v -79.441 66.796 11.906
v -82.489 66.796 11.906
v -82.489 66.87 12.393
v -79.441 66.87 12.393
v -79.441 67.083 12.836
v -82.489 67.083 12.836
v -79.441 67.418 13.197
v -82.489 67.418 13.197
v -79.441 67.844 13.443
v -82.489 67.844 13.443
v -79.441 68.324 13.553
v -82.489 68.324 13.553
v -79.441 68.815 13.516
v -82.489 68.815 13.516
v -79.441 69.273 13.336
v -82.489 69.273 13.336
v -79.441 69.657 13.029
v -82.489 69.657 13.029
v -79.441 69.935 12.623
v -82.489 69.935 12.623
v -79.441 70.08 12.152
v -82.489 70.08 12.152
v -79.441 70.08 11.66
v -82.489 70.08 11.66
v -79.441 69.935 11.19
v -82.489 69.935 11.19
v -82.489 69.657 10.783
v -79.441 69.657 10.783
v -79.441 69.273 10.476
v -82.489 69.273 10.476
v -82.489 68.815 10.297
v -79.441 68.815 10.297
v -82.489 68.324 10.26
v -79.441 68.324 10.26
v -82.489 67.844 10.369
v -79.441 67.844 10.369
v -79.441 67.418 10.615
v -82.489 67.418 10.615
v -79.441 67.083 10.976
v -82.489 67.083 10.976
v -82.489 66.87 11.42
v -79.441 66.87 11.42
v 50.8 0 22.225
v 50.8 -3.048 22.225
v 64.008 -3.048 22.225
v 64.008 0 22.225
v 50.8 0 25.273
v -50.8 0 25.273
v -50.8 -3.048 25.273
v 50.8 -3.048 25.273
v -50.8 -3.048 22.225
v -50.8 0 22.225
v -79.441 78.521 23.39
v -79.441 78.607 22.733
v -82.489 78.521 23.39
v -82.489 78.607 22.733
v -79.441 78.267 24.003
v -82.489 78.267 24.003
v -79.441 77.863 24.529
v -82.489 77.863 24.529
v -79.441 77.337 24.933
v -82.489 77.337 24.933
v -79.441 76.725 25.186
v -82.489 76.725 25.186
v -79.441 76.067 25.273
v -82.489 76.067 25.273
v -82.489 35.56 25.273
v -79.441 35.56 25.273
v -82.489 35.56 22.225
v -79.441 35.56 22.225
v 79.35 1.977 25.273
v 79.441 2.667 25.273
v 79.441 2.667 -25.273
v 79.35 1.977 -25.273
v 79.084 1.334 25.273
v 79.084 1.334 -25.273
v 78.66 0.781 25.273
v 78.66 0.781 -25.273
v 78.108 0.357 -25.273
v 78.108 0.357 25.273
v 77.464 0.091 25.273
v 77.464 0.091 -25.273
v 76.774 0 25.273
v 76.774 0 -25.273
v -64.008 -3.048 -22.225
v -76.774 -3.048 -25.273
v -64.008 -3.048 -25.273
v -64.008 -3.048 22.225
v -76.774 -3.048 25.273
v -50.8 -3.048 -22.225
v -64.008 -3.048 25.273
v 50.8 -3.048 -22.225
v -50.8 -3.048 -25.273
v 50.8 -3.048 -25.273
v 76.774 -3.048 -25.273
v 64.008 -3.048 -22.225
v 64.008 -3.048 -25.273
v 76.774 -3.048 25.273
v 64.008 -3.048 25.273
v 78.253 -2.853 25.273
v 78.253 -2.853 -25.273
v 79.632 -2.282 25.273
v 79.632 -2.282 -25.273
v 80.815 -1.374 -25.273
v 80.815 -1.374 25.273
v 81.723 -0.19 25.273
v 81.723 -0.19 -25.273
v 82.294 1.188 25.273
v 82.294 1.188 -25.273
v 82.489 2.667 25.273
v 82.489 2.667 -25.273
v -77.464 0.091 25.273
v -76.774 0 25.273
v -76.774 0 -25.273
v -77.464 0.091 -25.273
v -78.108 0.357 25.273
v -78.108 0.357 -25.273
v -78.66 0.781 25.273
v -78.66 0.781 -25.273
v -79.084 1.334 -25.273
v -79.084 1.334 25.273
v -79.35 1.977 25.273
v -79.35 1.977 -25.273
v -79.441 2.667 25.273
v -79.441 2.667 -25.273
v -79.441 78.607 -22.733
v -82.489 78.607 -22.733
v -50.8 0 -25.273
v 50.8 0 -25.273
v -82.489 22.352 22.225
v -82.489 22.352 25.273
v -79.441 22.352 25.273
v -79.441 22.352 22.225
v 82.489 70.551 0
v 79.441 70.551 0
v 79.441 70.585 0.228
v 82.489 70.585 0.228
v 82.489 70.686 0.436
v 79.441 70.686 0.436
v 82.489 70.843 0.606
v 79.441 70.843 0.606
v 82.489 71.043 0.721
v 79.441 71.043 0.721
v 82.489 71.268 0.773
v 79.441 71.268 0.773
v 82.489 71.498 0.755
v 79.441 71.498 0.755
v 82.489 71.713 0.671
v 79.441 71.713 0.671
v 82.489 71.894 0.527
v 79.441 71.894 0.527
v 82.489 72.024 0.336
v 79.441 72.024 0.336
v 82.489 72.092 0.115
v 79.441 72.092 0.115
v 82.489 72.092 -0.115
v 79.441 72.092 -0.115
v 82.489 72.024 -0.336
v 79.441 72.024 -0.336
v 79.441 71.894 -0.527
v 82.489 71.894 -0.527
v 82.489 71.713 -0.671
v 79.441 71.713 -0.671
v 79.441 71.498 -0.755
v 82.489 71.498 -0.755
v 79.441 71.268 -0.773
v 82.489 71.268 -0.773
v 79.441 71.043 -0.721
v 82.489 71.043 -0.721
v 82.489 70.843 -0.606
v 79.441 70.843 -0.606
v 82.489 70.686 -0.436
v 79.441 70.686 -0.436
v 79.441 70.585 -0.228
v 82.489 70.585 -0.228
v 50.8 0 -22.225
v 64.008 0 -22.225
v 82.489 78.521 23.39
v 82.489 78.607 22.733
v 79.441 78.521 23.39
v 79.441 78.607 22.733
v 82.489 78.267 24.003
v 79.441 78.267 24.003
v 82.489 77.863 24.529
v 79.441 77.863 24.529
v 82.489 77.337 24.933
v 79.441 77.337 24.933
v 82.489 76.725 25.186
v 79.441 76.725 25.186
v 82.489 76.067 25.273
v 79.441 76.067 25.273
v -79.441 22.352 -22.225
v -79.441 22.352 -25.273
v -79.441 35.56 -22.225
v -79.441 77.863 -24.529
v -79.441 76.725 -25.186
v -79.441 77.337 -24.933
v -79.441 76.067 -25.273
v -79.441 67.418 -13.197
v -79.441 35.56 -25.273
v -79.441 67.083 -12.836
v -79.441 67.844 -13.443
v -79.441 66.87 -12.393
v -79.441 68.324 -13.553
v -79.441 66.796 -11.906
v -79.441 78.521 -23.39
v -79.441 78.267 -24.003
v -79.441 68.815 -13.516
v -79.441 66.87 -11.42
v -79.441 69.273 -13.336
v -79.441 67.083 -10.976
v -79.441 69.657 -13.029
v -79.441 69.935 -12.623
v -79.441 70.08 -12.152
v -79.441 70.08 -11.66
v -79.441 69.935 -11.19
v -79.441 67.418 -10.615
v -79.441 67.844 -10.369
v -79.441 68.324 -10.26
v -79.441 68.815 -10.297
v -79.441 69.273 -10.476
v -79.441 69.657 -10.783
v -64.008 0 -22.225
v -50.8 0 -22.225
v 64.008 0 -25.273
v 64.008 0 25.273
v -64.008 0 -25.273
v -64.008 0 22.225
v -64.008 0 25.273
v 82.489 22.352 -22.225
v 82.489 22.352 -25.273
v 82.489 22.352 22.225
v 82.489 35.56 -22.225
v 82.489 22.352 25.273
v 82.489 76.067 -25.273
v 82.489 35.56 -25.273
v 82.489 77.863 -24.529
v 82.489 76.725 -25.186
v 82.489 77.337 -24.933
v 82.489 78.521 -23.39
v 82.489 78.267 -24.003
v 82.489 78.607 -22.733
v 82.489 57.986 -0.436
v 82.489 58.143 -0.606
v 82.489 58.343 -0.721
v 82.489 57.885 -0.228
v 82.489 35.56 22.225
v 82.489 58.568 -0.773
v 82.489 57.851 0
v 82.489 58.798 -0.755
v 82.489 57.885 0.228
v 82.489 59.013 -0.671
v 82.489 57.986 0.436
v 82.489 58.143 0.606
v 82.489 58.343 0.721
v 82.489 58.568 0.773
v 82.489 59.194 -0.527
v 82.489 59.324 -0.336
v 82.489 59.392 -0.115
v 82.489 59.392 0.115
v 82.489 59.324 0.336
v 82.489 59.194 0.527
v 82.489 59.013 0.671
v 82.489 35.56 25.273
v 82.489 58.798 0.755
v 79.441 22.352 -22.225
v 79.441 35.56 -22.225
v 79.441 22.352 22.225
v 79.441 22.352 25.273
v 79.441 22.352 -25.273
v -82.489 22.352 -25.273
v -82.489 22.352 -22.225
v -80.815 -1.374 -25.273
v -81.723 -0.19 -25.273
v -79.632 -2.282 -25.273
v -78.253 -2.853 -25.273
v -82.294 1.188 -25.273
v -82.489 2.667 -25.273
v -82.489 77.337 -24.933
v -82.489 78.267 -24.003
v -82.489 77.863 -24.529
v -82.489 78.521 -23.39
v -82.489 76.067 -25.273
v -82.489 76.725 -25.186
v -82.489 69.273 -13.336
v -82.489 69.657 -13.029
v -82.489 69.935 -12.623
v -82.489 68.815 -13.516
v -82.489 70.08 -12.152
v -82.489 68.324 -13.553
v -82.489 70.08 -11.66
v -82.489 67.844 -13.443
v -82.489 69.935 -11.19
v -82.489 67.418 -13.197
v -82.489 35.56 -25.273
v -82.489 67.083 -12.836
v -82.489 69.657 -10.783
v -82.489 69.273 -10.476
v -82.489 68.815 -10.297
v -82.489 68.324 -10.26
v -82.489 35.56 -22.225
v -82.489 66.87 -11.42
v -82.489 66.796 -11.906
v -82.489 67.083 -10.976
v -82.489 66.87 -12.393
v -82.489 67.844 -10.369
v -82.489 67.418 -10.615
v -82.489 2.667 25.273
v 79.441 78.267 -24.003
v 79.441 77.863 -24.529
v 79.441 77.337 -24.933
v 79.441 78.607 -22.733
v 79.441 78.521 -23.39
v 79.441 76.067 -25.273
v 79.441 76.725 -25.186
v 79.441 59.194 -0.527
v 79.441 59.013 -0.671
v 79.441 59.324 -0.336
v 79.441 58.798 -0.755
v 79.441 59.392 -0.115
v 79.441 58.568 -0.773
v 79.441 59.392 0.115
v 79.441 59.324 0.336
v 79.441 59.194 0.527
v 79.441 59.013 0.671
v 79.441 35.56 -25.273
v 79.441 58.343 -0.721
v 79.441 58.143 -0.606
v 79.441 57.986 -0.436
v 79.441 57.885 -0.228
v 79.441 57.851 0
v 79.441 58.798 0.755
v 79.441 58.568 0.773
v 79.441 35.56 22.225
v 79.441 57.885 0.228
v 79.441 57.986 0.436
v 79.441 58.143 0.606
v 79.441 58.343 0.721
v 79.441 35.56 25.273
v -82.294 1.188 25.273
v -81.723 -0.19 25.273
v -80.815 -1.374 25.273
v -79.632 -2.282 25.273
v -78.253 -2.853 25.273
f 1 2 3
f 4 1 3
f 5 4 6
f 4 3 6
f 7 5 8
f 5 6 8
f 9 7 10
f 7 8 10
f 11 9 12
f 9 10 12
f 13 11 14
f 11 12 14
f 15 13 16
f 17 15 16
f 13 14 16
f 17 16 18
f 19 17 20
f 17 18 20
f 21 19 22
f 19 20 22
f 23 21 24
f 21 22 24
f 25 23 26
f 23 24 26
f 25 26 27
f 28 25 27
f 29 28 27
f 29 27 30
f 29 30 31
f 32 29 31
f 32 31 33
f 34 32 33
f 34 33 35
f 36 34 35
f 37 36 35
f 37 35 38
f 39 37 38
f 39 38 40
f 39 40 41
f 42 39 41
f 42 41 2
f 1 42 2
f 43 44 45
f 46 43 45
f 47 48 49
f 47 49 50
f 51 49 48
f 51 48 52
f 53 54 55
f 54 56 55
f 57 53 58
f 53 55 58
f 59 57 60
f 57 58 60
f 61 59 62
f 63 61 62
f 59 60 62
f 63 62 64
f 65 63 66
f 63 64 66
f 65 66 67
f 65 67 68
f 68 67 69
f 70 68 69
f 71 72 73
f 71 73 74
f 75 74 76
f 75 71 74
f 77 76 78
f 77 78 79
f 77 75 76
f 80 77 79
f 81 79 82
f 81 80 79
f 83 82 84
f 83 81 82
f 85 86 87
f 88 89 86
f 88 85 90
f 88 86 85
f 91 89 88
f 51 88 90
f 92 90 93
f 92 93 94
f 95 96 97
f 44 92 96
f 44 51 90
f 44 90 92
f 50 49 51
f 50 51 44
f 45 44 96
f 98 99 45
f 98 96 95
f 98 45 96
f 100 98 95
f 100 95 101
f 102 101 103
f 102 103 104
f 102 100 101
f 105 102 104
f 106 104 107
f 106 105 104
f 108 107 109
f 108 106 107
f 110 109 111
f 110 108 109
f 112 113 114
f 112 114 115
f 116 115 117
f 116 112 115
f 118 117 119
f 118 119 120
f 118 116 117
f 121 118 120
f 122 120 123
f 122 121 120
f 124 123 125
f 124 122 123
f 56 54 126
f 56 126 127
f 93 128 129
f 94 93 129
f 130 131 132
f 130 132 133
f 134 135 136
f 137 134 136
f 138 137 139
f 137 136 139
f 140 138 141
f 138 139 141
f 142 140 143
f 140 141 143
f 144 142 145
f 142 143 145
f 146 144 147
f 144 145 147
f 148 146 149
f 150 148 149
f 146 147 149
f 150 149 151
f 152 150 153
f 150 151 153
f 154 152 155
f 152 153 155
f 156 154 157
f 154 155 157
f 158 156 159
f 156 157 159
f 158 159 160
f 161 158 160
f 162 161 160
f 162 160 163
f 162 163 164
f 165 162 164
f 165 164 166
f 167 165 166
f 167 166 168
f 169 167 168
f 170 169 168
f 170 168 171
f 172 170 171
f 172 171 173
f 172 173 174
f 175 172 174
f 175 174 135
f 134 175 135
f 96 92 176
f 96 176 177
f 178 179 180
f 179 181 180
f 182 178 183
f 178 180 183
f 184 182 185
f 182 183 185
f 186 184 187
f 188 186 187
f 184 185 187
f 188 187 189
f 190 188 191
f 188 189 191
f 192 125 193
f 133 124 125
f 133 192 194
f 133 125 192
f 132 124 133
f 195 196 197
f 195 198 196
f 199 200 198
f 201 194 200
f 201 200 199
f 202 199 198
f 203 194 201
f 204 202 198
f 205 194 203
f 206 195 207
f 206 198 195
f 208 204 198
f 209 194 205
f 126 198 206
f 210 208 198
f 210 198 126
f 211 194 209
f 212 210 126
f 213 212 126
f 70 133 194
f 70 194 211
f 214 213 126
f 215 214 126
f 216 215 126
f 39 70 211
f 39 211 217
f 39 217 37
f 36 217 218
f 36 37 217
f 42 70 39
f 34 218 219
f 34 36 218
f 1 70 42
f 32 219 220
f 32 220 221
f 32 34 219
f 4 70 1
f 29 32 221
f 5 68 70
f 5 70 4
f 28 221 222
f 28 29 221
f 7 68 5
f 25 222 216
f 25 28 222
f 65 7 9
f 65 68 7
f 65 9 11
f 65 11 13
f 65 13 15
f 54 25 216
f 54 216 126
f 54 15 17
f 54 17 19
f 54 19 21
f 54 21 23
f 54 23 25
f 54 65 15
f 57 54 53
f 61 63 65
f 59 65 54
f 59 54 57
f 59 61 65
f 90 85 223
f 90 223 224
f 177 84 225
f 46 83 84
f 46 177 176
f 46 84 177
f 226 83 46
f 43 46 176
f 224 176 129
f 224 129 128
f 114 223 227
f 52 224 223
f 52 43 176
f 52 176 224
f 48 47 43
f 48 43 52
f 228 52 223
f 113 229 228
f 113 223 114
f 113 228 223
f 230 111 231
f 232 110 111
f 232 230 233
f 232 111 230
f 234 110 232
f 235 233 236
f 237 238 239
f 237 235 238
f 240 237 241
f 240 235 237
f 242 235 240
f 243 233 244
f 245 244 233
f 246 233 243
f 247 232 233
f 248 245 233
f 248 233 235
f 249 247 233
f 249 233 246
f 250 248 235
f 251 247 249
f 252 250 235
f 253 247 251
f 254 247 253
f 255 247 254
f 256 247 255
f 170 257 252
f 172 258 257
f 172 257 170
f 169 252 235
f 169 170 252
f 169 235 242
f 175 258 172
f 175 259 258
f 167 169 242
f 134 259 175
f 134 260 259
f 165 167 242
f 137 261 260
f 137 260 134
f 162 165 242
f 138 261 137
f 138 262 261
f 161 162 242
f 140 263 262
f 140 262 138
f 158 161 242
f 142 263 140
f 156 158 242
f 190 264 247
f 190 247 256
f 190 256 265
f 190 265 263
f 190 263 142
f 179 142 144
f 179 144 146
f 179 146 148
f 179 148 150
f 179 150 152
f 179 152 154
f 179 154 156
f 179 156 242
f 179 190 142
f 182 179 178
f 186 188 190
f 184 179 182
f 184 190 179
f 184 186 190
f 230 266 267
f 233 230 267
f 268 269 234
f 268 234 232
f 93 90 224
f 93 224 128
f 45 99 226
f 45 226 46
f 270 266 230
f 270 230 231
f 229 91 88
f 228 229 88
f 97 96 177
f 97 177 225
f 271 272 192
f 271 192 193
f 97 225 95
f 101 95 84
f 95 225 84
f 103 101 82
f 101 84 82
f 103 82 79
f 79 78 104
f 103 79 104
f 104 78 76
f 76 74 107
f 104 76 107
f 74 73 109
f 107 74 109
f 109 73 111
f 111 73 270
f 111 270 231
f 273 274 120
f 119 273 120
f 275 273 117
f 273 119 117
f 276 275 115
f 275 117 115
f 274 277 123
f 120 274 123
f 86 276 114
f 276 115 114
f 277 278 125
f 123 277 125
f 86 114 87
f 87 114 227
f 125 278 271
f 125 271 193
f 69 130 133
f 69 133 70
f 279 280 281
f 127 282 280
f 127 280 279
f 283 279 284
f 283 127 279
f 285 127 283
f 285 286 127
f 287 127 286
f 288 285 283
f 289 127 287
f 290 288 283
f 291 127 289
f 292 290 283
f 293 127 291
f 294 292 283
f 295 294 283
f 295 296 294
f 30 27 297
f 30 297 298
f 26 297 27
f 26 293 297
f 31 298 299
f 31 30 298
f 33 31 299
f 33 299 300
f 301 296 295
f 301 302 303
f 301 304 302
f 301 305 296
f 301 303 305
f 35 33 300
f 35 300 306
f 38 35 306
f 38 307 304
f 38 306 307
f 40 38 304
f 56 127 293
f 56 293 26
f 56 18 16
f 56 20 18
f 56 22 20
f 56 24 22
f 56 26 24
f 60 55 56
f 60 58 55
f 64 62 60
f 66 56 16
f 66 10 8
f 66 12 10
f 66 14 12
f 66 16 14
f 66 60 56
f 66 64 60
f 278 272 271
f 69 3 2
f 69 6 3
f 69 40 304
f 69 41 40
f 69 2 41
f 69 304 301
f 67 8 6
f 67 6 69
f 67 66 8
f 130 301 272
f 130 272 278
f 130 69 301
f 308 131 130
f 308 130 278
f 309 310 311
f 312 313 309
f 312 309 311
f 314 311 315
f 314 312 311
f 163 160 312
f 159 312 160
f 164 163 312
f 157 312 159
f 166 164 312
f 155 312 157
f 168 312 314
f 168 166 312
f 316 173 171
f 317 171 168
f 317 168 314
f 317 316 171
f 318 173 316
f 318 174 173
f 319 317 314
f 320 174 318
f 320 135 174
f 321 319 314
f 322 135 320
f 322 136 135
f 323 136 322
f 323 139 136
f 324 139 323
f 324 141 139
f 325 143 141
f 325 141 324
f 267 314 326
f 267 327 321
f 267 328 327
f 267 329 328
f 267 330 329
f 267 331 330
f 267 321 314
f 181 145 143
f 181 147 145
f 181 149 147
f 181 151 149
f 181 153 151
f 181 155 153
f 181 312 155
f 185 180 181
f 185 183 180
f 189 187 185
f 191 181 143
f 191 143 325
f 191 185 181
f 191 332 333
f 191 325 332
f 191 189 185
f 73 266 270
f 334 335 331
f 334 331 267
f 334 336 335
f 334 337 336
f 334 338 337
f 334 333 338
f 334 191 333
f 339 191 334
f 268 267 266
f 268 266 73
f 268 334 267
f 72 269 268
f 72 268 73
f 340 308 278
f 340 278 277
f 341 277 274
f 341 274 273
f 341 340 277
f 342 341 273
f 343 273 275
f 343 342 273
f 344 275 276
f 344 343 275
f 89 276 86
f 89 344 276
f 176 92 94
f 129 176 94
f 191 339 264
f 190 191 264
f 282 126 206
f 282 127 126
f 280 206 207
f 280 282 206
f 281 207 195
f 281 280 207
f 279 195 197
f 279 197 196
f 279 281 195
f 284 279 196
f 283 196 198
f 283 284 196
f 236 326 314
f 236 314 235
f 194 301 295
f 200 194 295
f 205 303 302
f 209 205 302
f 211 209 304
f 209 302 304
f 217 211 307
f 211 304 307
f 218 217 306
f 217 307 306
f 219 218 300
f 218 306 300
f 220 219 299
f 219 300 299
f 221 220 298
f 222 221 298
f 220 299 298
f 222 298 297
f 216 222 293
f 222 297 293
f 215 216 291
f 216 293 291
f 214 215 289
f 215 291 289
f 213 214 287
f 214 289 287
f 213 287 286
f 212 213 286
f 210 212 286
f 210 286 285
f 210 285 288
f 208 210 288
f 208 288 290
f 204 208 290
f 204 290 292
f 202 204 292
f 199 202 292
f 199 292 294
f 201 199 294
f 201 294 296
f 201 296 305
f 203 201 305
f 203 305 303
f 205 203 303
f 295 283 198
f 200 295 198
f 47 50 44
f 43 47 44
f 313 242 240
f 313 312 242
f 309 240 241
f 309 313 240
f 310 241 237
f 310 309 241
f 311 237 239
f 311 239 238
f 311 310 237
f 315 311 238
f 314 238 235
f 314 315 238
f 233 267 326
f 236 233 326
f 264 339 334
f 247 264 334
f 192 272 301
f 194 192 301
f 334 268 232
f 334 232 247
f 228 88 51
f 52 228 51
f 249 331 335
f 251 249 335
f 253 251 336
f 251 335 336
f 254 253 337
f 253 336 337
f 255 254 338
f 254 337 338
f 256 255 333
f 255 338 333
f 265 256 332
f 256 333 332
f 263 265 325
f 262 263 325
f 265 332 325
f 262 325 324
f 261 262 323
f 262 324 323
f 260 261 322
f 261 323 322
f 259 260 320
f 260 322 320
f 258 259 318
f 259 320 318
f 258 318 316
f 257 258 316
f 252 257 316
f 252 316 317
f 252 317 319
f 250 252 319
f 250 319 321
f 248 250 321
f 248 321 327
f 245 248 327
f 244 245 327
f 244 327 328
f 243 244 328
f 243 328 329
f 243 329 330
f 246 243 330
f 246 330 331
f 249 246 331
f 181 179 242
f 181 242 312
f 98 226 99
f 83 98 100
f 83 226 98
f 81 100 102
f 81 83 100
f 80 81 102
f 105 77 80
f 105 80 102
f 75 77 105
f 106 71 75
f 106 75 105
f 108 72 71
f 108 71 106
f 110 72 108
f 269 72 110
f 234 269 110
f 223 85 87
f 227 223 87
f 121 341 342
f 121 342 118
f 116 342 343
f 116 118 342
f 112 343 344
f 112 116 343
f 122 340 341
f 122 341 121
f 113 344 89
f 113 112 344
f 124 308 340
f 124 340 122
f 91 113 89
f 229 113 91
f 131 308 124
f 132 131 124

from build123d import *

# Parameters (mm, degrees)
BASE_FLANGE1_DEPTH      = 25.273
CUT_EXTRUDE1_DEPTH      = 117.714472655
CUT_EXTRUDE1_DEPTH_BACK = 117.714472655
SKETCH6_W               = 13.208
SKETCH6_H               = 3.048
CUT_EXTRUDE2_DEPTH      = 182.766885422
CUT_EXTRUDE2_DEPTH_BACK = 182.766885422
SKETCH7_W               = 3.048
SKETCH7_H               = 13.208
FILLET1_R               = 2.54
SKETCH8_R               = 0.7747
CUT_EXTRUDE3_DEPTH      = 182.766885422
CUT_EXTRUDE5_REACH      = 186.487
SKETCH10_R              = 1.651


# Sheet-metal steps are written as plain solids
with BuildPart() as part:
    # Sketch1 → Base-Flange1 (new, symmetric)
    with BuildSketch(Plane.XY):
        with BuildLine():
            Line((79.441088515, 78.607212609), (79.441088515, 2.667))
            ThreePointArc((79.441088515, 2.667), (78.6599423, 0.781146215), (76.774088515, 0))
            Line((76.774088515, 0), (-76.774088515, 0))
            ThreePointArc((-76.774088515, 0), (-78.6599423, 0.781146215), (-79.441088515, 2.667))
            Line((-79.441088515, 2.667), (-79.441088515, 78.607212609))
            Line((-79.441088515, 78.607212609), (-82.489088515, 78.607212609))
            Line((-82.489088515, 78.607212609), (-82.489088515, 2.667))
            ThreePointArc((-82.489088515, 2.667), (-80.815203769, -1.374115254), (-76.774088515, -3.048))
            Line((-76.774088515, -3.048), (76.774088515, -3.048))
            ThreePointArc((76.774088515, -3.048), (80.815203769, -1.374115254), (82.489088515, 2.667))
            Line((82.489088515, 2.667), (82.489088515, 78.607212609))
            Line((82.489088515, 78.607212609), (79.441088515, 78.607212609))
        make_face()
    extrude(amount=BASE_FLANGE1_DEPTH, both=True)

    # Sketch6 → Cut-Extrude1 (cut, two sides: drawn at the far end of the back side and taken through both)
    with BuildSketch(Plane(origin=(0, 0, 0), x_dir=(1, 0, 0), z_dir=(0, 1, 0)).offset(-CUT_EXTRUDE1_DEPTH_BACK)):
        with Locations((-57.404, 23.749)):
            Rectangle(SKETCH6_W, SKETCH6_H)
        with Locations((-57.404, -23.749)):
            Rectangle(SKETCH6_W, SKETCH6_H)
        with Locations((57.404, -23.749)):
            Rectangle(SKETCH6_W, SKETCH6_H)
        with Locations((57.404, 23.749)):
            Rectangle(SKETCH6_W, SKETCH6_H)
    extrude(amount=CUT_EXTRUDE1_DEPTH + CUT_EXTRUDE1_DEPTH_BACK, mode=Mode.SUBTRACT)

    # Sketch7 → Cut-Extrude2 (cut, two sides: drawn at the far end of the back side and taken through both)
    with BuildSketch(Plane(origin=(-79.441088515, 0, 0), x_dir=(0, 0, -1), z_dir=(1, 0, 0)).offset(-CUT_EXTRUDE2_DEPTH_BACK)):
        with Locations((-23.749, 28.956)):
            Rectangle(SKETCH7_W, SKETCH7_H)
        with Locations((23.749, 28.956)):
            Rectangle(SKETCH7_W, SKETCH7_H)
    extrude(amount=CUT_EXTRUDE2_DEPTH + CUT_EXTRUDE2_DEPTH_BACK, mode=Mode.SUBTRACT)

    # Fillet1
    fillet1_edges = [part.edges().sort_by_distance(p)[0] for p in [
        (80.965088515, 78.607212609, -25.273),
        (-80.965088515, 78.607212609, -25.273),
        (80.965088515, 78.607212609, 25.273),
        (-80.965088515, 78.607212609, 25.273),
    ]]
    fillet(fillet1_edges, radius=FILLET1_R)

    # Sketch8 → Cut-Extrude3 (cut, through all)
    with BuildSketch(Plane.ZY.offset(-79.441088515)):
        with Locations(Location((0, 58.625617182, 0), (0, 0, 270))):
            Circle(SKETCH8_R)
        with Locations(Location((0, 71.325617182, 0), (0, 0, 270))):
            Circle(SKETCH8_R)
    extrude(amount=-CUT_EXTRUDE3_DEPTH, mode=Mode.SUBTRACT)

    # Sketch10 → Cut-Extrude5 (cut, up to next)
    with BuildSketch(Plane.ZY.offset(82.489088515), mode=Mode.PRIVATE) as cut_extrude5_sk1:
        with Locations(Location((11.90625, 68.447212609, 0), (0, 0, 270))):
            Circle(SKETCH10_R)
    cut_extrude5_tool1 = extrude(cut_extrude5_sk1.sketch, amount=-CUT_EXTRUDE5_REACH, mode=Mode.PRIVATE) & part.part
    # Sketch10 → Cut-Extrude5 (cut, up to next)
    with BuildSketch(Plane.ZY.offset(82.489088515), mode=Mode.PRIVATE) as cut_extrude5_sk2:
        with Locations(Location((-11.90625, 68.447212609, 0), (0, 0, 270))):
            Circle(SKETCH10_R)
    cut_extrude5_tool2 = extrude(cut_extrude5_sk2.sketch, amount=-CUT_EXTRUDE5_REACH, mode=Mode.PRIVATE) & part.part
    add(cut_extrude5_tool1.solids().sort_by_distance((-82.489089, 68.447213, 11.90625))[0], mode=Mode.SUBTRACT)
    add(cut_extrude5_tool2.solids().sort_by_distance((-82.489089, 68.447213, -11.90625))[0], mode=Mode.SUBTRACT)


solid = part.part
